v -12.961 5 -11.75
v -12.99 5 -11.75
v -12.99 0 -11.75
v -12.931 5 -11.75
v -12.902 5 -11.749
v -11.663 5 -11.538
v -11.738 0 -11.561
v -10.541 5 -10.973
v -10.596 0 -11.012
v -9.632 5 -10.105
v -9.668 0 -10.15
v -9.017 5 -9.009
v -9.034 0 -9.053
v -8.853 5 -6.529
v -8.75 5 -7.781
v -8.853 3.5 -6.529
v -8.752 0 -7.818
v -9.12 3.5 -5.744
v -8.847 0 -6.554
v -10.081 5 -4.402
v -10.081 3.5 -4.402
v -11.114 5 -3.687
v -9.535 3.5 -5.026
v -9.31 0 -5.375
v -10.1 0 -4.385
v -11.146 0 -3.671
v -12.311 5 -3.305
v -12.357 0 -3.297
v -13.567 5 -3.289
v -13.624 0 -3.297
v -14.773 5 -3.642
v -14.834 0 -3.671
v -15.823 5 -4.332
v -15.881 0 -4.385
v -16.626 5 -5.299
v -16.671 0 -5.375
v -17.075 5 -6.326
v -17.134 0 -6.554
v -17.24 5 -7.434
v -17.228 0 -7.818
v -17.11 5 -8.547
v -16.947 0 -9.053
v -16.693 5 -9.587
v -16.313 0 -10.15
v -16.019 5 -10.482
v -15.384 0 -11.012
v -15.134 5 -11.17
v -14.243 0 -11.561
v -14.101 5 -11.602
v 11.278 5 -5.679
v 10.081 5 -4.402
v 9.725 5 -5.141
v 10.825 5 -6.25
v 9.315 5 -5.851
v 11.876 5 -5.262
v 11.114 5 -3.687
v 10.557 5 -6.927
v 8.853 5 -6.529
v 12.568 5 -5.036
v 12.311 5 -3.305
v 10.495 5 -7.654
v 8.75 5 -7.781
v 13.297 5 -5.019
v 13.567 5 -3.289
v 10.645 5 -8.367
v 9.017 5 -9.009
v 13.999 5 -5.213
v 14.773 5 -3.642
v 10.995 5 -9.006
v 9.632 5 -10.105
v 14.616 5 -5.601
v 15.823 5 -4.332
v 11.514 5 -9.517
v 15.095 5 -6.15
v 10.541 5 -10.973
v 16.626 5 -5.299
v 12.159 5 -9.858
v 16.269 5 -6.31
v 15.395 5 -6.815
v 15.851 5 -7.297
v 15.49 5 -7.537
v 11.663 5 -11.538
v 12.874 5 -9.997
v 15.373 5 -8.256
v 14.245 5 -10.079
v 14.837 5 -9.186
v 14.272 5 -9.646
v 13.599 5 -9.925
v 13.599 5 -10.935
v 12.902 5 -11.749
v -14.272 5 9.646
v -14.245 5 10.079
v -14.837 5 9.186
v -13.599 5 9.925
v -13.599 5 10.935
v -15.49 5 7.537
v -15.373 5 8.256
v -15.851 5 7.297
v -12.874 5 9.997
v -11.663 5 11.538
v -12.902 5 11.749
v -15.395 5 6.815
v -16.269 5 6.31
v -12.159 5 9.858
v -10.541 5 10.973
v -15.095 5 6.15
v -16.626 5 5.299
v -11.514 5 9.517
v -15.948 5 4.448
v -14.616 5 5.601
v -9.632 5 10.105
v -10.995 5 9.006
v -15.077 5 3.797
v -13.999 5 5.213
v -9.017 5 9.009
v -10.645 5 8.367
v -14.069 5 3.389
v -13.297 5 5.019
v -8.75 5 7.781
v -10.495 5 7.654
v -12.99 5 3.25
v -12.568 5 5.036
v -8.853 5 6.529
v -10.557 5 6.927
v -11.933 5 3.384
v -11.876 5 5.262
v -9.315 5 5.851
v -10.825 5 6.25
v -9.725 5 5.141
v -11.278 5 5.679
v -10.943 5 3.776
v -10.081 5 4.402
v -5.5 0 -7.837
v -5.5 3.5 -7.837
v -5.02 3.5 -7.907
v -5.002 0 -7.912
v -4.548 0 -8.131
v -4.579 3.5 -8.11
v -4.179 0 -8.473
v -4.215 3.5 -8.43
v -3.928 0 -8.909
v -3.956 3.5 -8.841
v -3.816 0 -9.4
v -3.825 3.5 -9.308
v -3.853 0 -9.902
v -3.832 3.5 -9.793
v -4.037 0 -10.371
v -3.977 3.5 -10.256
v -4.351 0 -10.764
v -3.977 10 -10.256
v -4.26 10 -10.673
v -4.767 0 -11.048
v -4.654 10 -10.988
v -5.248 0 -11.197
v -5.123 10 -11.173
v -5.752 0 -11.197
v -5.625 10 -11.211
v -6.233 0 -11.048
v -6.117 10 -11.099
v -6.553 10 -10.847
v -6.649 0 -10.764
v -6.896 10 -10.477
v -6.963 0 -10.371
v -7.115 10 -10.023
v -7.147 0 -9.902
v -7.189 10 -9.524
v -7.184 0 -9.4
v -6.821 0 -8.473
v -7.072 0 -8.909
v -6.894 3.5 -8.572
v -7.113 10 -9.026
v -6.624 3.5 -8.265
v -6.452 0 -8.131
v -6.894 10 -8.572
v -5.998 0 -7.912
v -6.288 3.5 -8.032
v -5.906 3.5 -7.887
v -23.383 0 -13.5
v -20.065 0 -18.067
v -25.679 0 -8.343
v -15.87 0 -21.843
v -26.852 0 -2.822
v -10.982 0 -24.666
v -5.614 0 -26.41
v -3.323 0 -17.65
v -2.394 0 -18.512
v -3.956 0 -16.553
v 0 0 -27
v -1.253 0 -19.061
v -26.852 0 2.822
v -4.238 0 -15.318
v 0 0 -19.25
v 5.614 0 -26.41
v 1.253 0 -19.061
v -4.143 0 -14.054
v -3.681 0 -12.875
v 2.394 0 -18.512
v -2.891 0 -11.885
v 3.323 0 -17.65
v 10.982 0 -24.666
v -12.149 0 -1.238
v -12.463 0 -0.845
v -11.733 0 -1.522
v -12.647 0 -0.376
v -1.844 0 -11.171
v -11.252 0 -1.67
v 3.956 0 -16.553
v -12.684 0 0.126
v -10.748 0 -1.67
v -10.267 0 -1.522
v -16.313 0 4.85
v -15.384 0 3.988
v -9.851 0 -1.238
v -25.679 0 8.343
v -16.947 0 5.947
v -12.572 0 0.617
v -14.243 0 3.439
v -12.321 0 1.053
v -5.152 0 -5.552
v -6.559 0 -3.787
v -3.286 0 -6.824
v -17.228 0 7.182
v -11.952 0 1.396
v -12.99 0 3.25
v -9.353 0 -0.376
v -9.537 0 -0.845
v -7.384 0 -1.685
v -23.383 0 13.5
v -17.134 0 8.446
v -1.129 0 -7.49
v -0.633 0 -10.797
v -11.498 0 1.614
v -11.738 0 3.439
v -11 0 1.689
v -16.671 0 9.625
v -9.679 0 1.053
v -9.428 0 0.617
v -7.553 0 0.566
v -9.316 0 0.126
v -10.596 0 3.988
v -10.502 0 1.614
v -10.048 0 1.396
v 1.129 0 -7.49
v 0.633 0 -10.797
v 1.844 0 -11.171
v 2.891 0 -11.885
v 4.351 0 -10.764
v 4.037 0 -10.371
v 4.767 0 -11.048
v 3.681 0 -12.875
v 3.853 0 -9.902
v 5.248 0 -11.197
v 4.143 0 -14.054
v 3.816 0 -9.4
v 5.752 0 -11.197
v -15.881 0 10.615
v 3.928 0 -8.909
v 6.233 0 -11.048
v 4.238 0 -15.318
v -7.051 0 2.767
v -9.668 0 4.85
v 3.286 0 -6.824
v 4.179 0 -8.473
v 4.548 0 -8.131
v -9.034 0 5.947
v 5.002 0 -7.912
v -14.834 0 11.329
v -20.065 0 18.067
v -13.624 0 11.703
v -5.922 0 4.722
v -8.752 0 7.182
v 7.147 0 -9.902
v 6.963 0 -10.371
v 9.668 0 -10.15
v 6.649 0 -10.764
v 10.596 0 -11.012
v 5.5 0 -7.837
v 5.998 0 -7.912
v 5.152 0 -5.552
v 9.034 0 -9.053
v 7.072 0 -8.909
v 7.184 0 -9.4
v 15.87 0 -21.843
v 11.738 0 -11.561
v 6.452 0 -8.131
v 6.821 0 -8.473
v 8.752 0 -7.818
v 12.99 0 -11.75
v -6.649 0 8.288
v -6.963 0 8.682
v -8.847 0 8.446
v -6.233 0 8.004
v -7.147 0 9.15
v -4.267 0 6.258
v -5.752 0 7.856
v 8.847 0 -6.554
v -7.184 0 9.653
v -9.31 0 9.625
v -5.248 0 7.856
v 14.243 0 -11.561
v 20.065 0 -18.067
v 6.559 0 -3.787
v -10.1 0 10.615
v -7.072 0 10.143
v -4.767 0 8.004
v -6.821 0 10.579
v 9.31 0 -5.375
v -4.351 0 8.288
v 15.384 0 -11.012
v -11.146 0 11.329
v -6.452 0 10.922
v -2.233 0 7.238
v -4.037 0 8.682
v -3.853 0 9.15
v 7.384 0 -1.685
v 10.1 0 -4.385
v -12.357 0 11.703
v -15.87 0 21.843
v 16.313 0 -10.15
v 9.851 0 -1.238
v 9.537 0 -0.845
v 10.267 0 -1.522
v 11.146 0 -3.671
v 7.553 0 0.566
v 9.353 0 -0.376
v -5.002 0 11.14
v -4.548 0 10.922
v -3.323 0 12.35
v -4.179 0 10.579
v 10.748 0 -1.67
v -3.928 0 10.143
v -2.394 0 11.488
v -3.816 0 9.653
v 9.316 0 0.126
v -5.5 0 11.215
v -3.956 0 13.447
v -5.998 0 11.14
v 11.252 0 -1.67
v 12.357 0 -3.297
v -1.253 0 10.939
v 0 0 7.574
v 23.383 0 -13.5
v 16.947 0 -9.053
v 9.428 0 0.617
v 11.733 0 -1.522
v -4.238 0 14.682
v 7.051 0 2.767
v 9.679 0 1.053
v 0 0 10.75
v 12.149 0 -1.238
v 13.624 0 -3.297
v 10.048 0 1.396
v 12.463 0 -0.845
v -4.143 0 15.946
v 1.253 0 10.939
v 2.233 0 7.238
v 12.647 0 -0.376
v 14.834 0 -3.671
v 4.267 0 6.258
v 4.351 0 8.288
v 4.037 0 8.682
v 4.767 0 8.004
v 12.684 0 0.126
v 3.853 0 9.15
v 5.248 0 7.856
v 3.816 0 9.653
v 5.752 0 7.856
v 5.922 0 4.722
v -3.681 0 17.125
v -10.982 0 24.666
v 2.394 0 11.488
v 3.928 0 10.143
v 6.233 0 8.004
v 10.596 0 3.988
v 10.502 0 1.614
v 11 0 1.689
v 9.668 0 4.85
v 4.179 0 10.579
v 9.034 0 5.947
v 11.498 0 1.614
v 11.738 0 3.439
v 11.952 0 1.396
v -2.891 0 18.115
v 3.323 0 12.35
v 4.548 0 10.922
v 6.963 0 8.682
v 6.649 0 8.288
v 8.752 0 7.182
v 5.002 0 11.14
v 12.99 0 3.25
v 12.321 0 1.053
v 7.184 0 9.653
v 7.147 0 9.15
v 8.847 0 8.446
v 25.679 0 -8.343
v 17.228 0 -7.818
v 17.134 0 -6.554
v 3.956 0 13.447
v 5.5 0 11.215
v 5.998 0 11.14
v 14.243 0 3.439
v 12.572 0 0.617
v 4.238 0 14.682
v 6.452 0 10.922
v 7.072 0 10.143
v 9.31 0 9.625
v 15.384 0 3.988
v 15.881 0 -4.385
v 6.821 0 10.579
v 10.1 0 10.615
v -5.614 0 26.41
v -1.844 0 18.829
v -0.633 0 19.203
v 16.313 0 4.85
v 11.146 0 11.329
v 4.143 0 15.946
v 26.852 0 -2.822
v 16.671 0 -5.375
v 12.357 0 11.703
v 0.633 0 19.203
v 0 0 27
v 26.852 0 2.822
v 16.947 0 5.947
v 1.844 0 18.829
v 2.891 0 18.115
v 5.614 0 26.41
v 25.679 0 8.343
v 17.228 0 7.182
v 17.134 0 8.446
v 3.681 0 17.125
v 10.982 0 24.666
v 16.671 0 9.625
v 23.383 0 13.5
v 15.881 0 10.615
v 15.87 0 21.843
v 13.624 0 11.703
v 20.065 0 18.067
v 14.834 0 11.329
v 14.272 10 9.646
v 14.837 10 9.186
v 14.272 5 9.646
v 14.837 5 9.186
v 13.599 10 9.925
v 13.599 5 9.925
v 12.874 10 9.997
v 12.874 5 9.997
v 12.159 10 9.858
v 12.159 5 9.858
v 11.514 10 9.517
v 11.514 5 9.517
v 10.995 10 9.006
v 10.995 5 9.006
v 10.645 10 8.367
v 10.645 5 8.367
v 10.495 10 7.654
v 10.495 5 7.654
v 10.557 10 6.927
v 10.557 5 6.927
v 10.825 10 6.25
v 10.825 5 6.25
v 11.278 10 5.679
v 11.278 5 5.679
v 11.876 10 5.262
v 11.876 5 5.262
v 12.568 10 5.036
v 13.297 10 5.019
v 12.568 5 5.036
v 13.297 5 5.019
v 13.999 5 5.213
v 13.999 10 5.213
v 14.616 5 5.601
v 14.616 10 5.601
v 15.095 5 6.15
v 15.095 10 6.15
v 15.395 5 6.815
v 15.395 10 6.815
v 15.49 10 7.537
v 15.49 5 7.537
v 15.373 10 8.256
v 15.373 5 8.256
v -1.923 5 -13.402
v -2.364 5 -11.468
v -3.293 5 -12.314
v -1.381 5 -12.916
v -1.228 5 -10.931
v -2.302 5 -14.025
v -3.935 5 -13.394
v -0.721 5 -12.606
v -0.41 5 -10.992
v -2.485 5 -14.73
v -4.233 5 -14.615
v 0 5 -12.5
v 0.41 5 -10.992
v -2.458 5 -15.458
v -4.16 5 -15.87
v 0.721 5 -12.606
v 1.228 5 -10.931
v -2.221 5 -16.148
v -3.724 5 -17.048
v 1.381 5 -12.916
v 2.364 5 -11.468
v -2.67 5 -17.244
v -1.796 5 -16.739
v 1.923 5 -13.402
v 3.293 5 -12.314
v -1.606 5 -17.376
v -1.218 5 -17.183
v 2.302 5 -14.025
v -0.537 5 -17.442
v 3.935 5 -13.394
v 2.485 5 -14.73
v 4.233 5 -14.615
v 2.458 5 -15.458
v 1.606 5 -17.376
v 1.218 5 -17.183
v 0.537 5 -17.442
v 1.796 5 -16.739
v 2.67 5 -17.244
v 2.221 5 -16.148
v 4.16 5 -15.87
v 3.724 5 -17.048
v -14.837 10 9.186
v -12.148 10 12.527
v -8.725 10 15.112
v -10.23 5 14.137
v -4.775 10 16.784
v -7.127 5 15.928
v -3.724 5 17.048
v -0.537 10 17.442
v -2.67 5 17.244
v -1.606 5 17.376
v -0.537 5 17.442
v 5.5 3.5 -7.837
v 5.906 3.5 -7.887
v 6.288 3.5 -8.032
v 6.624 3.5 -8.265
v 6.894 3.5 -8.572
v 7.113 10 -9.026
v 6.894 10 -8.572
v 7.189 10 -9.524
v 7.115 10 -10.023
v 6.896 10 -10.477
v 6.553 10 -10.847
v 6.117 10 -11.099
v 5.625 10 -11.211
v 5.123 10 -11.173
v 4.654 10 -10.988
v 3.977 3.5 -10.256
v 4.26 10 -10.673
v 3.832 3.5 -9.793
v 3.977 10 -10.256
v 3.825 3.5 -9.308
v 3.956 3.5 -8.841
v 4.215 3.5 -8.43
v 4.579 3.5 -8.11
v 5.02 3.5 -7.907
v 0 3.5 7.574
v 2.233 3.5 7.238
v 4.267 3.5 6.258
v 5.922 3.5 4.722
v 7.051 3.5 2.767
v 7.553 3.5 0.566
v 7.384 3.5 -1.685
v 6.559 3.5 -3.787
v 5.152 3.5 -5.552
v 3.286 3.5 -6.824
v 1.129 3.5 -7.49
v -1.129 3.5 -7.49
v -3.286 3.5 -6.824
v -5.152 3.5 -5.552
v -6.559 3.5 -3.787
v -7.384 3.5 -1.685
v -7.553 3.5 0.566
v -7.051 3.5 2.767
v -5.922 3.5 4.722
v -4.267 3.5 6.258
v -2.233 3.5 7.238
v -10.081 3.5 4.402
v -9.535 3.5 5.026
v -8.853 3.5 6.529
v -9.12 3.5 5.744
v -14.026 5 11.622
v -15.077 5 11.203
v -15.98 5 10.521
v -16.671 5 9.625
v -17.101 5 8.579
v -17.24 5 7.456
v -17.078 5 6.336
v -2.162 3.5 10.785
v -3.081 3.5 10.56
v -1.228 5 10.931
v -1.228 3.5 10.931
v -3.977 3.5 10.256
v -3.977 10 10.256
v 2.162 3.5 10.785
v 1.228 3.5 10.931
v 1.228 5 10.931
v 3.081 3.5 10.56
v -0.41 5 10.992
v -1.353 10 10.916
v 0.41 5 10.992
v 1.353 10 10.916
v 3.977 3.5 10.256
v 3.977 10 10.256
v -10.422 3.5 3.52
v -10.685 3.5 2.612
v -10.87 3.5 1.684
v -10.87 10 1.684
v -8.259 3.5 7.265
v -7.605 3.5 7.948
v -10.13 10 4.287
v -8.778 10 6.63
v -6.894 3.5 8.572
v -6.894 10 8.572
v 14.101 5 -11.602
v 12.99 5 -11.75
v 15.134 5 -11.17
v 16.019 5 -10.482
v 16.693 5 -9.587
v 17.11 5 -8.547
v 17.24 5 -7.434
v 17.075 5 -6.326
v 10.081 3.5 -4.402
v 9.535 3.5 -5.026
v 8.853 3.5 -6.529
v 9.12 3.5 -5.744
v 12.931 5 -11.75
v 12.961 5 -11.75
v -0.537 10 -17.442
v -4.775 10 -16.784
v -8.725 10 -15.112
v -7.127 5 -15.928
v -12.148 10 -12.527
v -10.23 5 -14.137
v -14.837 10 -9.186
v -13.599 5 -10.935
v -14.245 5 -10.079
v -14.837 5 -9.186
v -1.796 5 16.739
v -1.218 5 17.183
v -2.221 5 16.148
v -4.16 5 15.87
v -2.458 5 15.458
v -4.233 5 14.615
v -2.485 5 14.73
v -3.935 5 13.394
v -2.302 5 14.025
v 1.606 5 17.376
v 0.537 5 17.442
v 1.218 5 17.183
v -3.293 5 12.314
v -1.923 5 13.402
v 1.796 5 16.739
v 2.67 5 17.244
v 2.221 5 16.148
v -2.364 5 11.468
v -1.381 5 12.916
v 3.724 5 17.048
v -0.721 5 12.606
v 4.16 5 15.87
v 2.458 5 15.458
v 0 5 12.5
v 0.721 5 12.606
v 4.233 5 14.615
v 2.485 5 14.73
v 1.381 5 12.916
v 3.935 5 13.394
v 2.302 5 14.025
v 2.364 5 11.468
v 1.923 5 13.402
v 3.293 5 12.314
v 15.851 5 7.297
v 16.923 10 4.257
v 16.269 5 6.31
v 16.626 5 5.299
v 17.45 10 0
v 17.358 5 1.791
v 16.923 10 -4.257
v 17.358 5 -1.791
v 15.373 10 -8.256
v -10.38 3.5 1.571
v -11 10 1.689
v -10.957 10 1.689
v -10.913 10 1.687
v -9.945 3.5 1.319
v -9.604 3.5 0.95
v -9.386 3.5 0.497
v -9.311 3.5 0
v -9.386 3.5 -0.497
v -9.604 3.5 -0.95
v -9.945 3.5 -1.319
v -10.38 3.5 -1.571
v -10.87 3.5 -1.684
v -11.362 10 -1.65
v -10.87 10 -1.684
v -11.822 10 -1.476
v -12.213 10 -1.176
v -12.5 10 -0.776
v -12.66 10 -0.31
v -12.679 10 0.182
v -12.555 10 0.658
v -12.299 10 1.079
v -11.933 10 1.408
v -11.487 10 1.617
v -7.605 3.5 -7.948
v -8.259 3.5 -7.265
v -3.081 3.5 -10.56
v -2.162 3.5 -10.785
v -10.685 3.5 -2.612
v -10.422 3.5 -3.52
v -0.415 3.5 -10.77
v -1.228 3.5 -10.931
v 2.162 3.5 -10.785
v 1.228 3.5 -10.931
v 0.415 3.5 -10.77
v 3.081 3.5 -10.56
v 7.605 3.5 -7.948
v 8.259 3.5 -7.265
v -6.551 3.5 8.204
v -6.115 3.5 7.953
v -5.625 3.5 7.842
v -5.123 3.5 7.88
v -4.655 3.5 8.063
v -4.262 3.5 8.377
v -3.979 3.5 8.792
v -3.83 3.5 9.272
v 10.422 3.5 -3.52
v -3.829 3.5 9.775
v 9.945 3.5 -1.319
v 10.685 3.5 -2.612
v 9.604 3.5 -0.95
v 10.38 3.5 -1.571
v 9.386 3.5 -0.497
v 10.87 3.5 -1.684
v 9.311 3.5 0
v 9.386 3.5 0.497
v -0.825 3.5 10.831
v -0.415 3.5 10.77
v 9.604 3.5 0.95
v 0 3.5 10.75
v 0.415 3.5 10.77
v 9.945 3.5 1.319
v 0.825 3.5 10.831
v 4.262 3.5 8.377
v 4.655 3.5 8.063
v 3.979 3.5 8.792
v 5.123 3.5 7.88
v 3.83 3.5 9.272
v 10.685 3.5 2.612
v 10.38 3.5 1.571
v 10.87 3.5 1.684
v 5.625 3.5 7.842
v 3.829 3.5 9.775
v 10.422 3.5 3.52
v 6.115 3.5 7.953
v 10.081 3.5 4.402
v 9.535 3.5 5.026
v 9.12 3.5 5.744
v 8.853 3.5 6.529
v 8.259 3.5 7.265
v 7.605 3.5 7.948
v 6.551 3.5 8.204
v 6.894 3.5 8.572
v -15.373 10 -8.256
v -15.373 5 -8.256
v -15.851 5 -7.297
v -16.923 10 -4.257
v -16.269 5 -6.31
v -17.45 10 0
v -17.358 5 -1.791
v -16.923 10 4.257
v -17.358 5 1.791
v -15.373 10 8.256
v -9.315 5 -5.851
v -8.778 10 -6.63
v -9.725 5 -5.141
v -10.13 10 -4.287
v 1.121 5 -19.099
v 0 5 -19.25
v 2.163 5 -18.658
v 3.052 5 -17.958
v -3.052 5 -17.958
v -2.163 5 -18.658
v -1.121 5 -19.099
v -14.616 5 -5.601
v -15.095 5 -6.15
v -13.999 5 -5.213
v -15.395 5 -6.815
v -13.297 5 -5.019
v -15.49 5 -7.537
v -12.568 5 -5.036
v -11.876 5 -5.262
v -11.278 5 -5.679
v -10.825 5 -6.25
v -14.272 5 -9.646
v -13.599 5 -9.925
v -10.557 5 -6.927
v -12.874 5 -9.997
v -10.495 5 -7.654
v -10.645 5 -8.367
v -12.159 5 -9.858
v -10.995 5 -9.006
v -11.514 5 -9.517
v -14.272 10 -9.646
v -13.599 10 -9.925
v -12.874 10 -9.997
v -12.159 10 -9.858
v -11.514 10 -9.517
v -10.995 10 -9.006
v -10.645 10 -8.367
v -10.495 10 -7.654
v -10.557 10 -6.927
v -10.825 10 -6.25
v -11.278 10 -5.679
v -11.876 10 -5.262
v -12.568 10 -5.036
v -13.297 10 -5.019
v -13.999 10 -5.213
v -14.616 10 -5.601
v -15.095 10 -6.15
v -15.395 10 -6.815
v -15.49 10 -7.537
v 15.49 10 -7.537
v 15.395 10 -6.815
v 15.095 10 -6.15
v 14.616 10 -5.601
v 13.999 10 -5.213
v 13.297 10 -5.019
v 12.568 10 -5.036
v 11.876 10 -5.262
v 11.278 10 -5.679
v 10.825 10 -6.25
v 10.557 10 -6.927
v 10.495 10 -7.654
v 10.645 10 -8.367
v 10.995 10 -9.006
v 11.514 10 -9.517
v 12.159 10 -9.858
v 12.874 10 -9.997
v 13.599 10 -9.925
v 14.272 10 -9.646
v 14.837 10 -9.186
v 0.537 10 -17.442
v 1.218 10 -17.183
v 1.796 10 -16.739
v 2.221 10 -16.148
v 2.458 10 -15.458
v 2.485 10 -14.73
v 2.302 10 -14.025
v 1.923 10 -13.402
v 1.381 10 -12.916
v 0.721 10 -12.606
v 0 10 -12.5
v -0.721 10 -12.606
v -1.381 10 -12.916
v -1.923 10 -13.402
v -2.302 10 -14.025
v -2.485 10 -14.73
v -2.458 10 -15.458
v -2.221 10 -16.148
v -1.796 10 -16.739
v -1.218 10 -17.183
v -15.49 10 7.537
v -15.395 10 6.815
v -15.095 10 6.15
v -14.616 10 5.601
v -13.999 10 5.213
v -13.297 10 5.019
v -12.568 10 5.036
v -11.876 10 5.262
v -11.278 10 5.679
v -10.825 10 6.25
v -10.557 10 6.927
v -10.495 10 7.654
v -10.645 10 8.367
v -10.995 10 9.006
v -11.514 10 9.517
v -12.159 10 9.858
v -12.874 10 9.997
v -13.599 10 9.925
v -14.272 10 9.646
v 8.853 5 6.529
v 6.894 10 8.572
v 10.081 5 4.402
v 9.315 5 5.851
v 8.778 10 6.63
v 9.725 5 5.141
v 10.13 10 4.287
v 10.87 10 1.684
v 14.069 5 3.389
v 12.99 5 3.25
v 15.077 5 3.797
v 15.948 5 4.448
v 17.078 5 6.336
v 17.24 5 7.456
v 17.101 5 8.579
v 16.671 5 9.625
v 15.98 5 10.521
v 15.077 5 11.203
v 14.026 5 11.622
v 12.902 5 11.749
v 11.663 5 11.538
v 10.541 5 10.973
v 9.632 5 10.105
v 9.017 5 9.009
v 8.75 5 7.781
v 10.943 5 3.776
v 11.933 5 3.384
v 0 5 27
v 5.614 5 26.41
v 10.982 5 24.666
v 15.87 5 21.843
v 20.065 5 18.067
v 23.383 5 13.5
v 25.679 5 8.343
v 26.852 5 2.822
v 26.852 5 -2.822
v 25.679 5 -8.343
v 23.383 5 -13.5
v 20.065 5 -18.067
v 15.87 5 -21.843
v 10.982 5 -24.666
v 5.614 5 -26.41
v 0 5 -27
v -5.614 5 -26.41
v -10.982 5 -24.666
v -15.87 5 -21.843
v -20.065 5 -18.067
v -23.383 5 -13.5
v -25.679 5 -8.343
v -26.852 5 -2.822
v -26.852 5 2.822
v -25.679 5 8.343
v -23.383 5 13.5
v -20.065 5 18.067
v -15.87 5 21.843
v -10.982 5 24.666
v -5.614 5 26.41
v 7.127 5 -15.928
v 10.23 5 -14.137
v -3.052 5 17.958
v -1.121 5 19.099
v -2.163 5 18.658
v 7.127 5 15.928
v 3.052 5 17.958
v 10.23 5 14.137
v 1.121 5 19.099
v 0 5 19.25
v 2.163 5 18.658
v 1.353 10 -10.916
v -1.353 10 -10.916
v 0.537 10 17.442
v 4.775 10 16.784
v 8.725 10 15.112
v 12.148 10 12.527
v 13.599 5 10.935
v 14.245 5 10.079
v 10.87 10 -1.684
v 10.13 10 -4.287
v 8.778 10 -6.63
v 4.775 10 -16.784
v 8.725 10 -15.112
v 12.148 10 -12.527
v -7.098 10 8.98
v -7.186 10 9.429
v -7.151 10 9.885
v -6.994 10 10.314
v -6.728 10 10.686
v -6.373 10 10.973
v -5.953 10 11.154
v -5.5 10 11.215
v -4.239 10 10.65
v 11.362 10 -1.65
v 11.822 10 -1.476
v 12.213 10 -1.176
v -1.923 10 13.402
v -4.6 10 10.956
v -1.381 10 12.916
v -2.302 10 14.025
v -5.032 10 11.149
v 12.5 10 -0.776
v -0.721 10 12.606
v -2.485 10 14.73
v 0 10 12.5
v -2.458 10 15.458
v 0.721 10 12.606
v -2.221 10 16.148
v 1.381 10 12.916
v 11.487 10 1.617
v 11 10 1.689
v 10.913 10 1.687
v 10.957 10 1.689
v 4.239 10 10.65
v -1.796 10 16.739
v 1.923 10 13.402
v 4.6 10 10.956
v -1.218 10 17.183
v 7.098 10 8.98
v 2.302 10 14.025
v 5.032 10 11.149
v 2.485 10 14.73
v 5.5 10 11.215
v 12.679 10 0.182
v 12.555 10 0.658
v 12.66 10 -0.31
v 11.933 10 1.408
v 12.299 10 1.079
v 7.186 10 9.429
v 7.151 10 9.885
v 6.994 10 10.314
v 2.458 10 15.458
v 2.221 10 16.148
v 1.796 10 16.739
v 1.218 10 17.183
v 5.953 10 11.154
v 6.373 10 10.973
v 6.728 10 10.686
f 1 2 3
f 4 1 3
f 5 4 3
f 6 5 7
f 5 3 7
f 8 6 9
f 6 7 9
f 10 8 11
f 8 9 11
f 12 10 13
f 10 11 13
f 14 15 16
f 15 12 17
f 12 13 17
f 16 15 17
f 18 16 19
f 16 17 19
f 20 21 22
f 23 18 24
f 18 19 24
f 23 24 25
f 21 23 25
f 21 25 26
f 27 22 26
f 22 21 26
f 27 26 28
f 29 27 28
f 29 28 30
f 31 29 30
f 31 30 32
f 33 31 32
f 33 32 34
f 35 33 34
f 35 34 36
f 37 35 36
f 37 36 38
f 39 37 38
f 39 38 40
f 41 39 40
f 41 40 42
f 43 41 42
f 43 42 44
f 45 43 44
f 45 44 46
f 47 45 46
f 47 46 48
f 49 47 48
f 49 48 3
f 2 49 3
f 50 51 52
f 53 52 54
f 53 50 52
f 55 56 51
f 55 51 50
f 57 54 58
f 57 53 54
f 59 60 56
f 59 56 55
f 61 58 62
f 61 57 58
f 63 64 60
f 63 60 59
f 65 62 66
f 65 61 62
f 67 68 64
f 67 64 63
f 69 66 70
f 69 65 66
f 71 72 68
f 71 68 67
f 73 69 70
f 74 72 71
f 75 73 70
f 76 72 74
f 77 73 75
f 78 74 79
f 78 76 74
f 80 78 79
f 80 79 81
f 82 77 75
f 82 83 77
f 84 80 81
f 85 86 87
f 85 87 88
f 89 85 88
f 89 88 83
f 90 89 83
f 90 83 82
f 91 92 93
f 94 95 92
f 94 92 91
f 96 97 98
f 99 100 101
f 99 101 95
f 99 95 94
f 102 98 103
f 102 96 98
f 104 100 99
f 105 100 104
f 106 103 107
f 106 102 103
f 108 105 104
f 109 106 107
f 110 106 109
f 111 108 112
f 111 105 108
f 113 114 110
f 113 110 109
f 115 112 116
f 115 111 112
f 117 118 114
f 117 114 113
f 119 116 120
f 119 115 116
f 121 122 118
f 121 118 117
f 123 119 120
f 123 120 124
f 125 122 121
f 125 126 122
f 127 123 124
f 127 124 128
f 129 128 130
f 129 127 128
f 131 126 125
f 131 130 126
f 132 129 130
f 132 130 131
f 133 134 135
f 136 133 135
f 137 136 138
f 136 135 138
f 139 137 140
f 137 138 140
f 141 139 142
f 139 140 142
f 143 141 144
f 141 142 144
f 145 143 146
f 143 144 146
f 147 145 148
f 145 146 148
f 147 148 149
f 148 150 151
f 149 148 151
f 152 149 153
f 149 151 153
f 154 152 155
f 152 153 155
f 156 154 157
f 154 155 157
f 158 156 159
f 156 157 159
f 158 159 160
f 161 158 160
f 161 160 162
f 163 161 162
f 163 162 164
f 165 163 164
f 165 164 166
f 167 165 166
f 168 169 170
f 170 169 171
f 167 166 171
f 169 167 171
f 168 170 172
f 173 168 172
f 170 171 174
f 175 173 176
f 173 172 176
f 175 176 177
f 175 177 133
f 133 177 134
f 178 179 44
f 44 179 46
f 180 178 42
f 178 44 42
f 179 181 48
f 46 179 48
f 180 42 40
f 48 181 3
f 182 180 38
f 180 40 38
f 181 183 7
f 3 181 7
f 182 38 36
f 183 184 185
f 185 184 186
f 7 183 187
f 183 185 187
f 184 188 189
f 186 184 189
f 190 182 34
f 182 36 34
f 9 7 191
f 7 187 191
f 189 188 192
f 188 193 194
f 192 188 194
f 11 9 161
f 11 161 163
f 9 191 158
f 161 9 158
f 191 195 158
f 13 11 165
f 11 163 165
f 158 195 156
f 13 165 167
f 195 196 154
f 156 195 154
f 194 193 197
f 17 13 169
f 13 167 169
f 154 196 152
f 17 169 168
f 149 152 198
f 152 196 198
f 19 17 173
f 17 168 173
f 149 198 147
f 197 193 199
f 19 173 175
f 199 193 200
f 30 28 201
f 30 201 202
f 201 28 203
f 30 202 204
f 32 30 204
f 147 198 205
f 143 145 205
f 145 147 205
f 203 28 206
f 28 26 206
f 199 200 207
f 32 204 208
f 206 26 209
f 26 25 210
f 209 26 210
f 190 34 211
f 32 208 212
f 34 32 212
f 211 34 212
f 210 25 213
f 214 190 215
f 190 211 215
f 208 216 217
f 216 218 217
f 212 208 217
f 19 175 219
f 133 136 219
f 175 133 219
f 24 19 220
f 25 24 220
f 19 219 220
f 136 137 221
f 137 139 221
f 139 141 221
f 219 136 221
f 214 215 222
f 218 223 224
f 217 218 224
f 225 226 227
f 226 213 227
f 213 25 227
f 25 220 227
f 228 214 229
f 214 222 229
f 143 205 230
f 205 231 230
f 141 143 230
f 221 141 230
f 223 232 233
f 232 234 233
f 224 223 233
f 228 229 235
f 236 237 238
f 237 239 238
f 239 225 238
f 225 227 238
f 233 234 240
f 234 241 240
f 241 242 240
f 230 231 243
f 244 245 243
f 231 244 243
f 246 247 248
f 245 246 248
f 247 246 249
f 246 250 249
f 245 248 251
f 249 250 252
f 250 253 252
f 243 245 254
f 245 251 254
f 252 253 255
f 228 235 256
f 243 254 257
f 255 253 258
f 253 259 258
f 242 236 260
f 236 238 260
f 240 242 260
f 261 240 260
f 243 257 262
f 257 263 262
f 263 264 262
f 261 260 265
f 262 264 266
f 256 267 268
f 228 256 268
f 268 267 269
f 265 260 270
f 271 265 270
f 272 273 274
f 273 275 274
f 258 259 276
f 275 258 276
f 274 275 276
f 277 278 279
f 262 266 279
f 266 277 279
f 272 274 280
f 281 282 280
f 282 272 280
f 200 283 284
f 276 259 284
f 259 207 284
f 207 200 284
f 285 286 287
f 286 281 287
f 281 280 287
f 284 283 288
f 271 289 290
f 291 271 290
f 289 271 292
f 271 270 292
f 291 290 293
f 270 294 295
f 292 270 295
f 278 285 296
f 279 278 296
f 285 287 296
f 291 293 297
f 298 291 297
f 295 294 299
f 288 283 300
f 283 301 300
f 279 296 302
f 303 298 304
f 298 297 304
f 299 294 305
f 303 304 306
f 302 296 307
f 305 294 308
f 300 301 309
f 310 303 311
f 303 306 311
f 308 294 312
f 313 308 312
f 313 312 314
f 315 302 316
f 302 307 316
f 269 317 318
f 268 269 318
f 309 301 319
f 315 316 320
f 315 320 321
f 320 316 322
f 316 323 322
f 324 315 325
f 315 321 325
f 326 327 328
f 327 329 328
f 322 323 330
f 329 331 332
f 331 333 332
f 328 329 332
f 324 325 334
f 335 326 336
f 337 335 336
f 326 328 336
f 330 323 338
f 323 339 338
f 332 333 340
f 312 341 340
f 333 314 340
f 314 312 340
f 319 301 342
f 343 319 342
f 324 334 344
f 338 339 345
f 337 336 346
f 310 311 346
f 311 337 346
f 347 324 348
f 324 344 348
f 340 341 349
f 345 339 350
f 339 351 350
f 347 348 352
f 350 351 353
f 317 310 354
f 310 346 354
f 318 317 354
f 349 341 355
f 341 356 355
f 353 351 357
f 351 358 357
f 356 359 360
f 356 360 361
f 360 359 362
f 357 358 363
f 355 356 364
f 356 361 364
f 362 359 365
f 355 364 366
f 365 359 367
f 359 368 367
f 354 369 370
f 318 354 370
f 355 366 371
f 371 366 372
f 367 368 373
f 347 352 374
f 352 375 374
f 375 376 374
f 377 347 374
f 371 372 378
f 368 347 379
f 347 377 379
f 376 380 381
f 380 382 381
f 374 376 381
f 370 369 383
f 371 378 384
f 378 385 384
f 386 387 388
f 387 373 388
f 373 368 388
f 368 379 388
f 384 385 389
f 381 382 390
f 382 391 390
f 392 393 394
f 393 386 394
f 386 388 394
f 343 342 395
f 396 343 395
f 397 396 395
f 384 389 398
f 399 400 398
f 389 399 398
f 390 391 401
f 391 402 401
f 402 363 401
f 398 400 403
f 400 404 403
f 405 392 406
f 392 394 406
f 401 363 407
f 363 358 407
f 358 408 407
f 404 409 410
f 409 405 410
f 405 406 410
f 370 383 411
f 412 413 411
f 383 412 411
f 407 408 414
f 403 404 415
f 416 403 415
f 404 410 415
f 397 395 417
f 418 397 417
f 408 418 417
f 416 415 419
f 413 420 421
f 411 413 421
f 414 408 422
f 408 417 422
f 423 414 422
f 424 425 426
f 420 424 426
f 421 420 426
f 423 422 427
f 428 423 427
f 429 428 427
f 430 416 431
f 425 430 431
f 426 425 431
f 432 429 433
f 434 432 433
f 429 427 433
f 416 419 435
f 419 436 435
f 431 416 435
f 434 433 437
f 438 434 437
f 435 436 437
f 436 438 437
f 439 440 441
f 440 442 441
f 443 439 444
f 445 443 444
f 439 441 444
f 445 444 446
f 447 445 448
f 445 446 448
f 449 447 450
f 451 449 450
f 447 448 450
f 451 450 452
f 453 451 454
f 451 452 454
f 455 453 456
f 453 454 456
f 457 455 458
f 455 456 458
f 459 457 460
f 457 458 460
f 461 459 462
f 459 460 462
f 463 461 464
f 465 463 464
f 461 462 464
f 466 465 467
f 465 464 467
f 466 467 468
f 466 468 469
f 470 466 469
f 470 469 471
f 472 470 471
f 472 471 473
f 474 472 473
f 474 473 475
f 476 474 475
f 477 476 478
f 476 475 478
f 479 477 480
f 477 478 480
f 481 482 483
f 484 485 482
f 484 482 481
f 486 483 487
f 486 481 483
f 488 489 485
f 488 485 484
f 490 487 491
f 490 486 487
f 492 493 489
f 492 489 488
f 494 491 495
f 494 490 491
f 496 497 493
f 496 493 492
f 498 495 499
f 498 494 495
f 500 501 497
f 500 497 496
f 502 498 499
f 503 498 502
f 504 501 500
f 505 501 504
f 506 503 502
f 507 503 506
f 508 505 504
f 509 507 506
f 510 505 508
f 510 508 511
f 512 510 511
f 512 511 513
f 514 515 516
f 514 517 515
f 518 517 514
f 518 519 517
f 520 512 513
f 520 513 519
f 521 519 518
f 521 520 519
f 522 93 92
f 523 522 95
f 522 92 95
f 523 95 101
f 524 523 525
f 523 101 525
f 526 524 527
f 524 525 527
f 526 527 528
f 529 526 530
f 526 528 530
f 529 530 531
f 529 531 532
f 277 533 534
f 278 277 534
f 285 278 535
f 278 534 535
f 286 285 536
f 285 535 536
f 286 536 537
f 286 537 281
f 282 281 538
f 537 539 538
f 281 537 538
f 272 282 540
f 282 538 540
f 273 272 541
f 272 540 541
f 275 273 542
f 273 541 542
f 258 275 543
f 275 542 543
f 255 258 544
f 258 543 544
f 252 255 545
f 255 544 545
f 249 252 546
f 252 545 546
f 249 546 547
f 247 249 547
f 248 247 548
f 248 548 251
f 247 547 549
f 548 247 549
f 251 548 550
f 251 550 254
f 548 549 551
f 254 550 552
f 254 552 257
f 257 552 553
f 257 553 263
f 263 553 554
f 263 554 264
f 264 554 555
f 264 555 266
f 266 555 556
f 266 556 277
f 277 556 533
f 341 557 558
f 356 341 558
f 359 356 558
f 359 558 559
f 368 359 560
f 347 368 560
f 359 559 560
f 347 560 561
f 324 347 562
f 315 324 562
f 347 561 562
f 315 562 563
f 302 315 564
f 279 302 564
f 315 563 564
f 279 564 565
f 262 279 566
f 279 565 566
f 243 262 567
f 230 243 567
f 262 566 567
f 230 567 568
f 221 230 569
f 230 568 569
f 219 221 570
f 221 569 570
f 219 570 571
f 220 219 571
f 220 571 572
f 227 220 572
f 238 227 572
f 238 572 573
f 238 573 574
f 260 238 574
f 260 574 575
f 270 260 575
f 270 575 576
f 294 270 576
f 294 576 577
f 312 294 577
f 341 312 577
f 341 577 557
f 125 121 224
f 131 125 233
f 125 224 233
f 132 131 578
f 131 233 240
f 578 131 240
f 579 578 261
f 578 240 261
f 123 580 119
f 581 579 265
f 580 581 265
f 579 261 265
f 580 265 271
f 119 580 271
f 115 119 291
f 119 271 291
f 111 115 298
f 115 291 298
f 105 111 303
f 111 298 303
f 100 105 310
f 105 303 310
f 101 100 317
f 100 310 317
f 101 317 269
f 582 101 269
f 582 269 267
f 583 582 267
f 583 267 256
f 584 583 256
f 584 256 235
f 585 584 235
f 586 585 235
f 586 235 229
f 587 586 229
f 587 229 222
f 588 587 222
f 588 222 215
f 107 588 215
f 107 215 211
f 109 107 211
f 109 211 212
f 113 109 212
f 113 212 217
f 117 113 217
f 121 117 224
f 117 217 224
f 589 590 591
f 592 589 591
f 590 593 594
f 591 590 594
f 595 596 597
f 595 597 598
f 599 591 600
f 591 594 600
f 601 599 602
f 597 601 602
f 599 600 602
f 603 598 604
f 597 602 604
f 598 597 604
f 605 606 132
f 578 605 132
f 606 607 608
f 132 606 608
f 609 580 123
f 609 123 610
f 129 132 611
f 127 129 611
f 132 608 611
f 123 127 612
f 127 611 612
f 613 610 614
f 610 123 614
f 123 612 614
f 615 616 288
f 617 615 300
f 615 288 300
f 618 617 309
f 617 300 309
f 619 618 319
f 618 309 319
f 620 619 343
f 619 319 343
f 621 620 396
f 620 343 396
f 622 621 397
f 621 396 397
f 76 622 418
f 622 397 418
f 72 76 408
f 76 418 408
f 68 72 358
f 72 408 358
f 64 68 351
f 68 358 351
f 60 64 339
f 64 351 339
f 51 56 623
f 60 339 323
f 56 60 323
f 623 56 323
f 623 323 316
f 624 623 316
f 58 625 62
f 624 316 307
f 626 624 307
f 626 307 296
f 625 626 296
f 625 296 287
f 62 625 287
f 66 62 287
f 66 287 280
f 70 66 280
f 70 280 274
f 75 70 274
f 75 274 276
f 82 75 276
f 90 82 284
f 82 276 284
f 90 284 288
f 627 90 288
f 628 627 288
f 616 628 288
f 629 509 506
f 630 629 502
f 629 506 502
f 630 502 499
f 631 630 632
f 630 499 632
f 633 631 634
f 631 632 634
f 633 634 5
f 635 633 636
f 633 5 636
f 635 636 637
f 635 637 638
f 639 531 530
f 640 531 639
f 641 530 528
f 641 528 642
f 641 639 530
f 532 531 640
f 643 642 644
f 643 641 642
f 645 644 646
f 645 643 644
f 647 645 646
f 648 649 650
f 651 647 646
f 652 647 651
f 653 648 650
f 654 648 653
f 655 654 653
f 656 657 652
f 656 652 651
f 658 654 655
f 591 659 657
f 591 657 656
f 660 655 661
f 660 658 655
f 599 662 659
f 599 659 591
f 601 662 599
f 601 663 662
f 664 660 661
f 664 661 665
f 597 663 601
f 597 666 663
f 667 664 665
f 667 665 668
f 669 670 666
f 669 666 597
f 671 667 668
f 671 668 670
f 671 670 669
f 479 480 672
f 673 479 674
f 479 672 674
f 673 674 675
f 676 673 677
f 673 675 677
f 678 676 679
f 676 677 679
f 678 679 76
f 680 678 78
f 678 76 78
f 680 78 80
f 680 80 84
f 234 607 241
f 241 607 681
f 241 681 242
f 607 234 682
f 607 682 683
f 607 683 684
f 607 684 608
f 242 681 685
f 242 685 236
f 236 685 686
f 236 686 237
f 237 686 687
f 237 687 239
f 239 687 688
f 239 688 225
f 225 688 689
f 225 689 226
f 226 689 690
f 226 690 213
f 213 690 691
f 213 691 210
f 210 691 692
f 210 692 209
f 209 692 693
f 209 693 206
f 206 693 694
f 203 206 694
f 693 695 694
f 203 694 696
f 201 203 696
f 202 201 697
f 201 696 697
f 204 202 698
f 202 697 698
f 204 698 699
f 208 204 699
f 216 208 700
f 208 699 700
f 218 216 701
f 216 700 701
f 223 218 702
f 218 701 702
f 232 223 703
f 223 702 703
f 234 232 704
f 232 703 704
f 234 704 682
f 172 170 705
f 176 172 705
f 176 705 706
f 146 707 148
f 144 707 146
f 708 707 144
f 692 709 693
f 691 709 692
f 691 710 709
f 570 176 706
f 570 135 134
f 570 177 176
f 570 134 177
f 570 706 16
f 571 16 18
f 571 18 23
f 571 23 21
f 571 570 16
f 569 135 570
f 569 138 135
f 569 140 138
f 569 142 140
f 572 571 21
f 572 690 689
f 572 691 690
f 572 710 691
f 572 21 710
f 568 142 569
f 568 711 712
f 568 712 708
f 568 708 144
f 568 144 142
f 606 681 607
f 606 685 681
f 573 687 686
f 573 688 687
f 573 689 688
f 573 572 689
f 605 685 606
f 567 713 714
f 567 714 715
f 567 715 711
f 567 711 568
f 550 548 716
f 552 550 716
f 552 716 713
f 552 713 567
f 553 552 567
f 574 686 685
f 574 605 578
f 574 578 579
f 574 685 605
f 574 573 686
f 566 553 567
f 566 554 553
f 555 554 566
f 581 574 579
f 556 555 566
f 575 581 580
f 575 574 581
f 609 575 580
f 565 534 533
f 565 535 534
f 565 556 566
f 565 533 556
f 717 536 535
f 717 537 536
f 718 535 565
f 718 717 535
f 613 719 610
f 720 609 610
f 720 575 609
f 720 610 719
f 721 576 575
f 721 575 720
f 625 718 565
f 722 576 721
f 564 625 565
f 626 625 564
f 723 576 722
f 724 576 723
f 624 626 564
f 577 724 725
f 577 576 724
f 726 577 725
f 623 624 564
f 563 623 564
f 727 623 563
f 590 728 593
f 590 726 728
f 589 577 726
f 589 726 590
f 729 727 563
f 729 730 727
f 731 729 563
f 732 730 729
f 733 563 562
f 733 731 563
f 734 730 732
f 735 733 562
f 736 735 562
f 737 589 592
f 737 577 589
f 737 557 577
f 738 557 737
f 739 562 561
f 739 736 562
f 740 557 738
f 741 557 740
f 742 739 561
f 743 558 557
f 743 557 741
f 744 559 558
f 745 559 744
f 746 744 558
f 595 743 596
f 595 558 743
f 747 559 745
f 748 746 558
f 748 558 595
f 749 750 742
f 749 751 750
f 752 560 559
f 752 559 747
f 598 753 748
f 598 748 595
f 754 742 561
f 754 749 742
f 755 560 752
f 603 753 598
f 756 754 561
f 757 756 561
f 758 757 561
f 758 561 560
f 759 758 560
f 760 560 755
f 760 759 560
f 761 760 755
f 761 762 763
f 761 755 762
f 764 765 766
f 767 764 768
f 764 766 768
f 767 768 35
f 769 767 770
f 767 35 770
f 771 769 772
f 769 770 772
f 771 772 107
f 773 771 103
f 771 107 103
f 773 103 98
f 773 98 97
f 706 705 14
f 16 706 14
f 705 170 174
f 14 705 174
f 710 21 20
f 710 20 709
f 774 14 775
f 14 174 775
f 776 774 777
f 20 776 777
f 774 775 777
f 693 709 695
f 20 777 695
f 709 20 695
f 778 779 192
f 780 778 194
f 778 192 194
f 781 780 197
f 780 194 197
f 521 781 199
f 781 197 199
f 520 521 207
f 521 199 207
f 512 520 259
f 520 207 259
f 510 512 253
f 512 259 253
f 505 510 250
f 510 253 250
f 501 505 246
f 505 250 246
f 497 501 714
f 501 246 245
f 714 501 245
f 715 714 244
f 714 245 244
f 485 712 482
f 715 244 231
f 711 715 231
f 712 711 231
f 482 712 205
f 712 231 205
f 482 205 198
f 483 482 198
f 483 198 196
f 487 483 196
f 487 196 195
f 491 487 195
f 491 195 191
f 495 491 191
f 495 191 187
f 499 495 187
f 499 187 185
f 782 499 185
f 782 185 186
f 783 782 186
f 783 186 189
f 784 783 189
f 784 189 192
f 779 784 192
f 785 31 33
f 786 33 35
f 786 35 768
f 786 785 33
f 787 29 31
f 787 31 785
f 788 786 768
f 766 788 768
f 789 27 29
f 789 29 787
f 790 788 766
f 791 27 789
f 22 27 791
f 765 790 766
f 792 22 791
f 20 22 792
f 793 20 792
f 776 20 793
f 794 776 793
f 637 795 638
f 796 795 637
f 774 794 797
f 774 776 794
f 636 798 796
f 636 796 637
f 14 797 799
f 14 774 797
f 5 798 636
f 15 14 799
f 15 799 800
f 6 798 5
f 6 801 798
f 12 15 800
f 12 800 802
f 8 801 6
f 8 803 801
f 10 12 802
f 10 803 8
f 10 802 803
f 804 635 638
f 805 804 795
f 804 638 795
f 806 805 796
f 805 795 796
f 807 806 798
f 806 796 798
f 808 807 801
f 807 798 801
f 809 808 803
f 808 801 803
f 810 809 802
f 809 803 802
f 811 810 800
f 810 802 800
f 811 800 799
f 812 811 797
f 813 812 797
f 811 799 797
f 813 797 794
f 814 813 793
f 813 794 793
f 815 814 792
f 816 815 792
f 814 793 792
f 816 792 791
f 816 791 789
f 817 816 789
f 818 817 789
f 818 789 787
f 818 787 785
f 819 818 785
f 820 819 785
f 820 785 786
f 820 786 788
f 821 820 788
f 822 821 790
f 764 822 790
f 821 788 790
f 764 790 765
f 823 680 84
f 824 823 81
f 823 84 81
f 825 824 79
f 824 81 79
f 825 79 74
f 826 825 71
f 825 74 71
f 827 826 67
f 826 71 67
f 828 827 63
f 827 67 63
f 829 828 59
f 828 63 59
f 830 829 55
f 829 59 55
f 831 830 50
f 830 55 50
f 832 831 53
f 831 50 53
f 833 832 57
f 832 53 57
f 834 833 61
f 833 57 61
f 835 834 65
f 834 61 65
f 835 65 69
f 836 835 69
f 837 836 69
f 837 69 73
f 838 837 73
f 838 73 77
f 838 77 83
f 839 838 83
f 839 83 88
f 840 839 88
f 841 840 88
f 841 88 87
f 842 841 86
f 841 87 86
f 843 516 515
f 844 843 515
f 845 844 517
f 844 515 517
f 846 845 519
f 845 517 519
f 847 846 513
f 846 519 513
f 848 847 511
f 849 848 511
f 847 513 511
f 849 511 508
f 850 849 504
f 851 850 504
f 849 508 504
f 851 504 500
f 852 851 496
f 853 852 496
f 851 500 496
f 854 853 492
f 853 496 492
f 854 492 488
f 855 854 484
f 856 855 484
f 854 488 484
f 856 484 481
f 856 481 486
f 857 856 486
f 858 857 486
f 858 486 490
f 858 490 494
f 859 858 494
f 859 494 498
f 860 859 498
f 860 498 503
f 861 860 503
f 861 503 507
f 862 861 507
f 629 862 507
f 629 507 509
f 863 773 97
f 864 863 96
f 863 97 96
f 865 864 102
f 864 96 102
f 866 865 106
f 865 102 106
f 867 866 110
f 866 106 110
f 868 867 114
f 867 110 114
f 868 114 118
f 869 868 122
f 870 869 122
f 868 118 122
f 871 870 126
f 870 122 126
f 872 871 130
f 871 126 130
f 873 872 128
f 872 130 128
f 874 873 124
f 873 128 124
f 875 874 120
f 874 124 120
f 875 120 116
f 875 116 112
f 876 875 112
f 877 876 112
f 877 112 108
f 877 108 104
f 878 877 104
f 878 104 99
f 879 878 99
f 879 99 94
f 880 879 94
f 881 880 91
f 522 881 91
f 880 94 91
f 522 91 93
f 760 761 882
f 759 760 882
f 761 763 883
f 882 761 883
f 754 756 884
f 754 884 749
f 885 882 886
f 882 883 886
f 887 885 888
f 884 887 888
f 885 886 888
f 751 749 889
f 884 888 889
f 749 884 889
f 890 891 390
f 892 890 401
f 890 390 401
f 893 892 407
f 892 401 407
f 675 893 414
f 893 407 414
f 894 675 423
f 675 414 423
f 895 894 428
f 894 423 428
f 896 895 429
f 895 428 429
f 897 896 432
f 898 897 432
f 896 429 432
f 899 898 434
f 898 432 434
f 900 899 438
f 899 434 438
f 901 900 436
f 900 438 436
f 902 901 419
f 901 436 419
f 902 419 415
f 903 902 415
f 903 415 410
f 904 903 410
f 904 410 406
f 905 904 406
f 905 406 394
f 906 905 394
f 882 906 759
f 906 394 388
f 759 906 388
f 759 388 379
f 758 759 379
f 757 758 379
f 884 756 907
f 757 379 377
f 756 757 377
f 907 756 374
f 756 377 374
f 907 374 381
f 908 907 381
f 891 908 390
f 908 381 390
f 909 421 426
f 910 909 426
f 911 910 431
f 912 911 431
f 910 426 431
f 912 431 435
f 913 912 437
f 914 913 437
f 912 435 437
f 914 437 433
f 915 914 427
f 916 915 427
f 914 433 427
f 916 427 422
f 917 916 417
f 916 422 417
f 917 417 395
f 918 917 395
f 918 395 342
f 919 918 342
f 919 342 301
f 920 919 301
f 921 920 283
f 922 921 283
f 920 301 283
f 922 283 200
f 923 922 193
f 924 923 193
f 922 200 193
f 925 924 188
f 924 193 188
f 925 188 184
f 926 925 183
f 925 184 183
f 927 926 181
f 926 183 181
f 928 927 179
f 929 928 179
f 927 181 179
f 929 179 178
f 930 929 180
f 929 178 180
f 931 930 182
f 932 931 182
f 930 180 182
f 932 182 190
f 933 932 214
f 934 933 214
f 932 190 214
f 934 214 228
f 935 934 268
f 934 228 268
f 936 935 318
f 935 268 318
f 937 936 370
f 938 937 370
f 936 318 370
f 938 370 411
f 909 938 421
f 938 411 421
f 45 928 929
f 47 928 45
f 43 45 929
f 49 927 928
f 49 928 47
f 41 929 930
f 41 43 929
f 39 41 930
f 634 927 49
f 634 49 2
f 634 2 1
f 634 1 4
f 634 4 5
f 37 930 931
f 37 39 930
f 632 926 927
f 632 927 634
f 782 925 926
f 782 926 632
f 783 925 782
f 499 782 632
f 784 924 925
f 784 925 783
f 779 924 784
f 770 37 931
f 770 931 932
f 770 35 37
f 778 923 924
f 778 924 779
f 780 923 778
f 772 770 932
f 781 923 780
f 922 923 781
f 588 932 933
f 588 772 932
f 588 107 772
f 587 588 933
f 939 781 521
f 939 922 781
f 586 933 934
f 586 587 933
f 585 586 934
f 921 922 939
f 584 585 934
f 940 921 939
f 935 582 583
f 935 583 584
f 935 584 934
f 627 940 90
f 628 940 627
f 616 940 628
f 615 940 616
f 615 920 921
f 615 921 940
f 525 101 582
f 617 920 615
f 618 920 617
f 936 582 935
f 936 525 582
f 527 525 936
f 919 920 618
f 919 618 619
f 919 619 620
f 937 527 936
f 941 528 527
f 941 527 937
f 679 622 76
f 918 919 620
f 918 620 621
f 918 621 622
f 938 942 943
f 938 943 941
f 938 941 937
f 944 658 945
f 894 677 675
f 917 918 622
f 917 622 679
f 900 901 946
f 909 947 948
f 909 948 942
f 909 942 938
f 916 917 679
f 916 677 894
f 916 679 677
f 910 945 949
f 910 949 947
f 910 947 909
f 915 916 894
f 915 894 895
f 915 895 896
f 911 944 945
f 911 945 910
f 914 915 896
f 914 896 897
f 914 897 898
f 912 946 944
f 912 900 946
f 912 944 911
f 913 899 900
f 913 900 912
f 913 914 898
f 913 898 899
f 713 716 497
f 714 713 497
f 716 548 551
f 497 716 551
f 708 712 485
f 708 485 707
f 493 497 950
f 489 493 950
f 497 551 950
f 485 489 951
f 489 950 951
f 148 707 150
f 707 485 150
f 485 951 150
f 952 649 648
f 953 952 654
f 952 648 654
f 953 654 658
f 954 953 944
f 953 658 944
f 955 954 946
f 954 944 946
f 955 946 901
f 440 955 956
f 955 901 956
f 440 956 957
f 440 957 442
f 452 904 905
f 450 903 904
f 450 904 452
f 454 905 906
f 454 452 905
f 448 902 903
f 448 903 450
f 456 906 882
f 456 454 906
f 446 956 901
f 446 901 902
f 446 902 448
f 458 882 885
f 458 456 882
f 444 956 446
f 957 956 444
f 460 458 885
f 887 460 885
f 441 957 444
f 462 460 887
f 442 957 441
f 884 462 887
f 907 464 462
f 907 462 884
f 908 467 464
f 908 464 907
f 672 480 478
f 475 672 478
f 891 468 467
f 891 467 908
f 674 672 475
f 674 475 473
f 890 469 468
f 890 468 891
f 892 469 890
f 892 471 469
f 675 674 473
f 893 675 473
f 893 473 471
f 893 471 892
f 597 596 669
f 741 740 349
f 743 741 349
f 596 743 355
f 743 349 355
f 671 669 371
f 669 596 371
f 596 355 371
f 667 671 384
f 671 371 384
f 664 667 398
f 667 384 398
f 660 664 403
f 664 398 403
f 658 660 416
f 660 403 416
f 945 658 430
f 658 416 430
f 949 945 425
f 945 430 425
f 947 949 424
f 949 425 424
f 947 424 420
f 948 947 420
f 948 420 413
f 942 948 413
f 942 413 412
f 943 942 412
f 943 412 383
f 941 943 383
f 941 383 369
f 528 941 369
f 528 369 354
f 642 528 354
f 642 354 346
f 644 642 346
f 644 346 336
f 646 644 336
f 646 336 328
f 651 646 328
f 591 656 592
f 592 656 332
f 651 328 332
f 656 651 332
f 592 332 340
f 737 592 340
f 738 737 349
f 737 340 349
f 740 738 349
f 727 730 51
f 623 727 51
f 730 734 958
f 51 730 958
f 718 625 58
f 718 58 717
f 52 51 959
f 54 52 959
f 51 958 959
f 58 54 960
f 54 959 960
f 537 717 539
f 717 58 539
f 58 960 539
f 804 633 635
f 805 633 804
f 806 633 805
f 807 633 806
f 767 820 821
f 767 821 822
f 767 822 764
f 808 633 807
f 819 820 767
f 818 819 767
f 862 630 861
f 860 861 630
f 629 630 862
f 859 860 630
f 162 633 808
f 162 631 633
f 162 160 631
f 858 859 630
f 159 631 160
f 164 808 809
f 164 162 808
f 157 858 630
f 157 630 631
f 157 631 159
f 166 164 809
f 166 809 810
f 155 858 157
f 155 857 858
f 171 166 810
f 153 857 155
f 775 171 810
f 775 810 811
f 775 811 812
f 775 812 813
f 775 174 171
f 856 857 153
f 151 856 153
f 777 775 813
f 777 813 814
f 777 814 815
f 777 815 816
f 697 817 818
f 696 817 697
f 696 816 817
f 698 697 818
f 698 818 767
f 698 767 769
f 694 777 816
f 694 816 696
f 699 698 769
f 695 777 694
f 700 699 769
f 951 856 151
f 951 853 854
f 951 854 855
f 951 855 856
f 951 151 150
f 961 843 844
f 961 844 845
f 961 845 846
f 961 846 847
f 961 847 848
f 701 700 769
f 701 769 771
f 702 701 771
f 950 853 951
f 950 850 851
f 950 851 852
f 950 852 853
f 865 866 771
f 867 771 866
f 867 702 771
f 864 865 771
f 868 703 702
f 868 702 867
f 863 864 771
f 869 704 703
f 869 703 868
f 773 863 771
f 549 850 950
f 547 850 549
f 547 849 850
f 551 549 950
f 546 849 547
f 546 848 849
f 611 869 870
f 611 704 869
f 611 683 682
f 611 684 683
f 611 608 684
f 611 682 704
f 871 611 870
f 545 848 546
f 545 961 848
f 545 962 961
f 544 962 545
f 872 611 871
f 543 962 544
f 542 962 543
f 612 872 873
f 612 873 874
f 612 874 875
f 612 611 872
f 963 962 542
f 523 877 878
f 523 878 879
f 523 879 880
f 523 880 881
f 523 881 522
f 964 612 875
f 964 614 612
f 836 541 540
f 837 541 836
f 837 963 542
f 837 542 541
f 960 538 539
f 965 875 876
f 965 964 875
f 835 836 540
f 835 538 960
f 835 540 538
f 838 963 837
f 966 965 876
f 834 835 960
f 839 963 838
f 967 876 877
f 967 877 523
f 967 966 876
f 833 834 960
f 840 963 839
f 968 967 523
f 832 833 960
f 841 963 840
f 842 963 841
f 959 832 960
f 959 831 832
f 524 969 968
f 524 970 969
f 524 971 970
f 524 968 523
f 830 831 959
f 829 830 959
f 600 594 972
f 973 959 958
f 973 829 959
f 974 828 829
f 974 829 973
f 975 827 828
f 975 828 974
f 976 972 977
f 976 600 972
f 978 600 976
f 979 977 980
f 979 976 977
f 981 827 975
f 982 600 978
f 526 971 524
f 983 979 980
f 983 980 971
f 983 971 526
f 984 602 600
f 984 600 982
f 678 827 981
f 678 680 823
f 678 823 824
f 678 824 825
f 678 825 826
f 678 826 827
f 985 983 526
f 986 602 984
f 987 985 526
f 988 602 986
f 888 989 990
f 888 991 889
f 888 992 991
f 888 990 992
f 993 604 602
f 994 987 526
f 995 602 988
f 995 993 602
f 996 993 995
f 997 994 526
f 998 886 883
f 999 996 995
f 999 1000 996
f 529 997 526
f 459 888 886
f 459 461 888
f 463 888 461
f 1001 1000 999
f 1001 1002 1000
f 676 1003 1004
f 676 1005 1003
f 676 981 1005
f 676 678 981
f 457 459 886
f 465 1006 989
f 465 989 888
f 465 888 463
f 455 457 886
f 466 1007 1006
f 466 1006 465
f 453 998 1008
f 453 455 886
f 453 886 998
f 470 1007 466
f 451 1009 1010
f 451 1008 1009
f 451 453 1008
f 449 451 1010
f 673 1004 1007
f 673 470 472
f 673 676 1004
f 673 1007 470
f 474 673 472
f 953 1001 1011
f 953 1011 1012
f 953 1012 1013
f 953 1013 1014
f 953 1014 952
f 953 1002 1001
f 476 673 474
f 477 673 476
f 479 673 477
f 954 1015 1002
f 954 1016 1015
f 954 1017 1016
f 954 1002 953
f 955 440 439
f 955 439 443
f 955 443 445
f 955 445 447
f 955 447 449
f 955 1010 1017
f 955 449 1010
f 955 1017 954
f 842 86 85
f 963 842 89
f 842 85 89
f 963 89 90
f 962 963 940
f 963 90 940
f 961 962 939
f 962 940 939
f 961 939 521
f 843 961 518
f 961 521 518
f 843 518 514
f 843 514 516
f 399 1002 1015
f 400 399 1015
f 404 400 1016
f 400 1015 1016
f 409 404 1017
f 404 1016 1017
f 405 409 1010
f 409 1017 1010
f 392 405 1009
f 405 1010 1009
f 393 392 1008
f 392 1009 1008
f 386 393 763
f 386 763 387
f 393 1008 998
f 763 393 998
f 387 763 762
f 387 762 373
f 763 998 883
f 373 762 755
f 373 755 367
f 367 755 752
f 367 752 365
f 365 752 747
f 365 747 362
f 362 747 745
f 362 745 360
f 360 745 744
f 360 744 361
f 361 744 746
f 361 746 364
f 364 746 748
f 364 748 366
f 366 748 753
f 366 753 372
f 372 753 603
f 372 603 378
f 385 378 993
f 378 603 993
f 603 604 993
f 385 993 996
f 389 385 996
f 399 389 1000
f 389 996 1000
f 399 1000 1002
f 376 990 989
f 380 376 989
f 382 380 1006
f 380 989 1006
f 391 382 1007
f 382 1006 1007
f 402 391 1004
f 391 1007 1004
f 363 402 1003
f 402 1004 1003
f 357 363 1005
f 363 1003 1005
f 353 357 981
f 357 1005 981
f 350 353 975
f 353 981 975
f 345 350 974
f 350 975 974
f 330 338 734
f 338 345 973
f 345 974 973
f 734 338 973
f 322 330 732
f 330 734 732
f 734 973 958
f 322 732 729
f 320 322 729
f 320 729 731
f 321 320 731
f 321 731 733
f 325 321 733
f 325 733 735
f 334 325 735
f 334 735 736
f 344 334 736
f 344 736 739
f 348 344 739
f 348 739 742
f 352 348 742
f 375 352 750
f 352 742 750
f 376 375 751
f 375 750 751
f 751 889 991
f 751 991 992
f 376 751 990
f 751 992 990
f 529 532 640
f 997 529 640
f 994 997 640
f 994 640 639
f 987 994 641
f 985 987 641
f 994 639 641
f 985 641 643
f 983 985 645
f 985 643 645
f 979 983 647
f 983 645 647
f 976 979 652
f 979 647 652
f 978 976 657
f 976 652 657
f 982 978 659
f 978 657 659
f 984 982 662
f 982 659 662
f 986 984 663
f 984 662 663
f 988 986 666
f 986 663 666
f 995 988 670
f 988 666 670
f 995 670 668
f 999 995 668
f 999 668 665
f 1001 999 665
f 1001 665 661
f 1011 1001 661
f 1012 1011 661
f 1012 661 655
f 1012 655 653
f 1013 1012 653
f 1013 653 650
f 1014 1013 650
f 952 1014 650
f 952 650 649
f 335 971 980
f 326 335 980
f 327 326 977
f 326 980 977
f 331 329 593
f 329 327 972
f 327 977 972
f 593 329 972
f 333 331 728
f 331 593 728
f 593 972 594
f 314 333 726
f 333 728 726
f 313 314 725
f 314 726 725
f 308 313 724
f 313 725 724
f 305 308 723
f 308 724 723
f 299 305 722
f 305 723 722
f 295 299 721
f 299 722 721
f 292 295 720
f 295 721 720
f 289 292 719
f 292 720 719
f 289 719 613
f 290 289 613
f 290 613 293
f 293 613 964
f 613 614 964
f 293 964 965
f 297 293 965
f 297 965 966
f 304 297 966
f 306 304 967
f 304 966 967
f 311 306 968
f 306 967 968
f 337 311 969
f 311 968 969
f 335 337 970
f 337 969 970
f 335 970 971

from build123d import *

# Parameters (mm, degrees)
SKETCH1_R           = 27
BOSS_EXTRUDE1_DEPTH = 5
SKETCH2_R           = 17.45
BOSS_EXTRUDE2_DEPTH = 5
SKETCH3_R           = 2.5
CUT_EXTRUDE1_DEPTH  = 15
SKETCH5_R           = 11
CUT_EXTRUDE2_DEPTH  = 6.5
SKETCH6_R           = 1.689113582
CUT_EXTRUDE3_DEPTH  = 36.5
SKETCH7_R           = 5
CUT_EXTRUDE4_DEPTH  = 36.5
SKETCH8_R           = 4.25
CUT_EXTRUDE5_DEPTH  = 5
CUT_EXTRUDE6_REACH  = 40.733
SKETCH10_R          = 7.574183751


with BuildPart() as part:
    # Sketch1 → Boss-Extrude1 (new body)
    with BuildSketch(Plane(origin=(0, 0, 0), x_dir=(1, 0, 0), z_dir=(0, 1, 0))):
        with Locations(Location((0, 0, 0), (0, 0, 270))):
            Circle(SKETCH1_R)
    extrude(amount=BOSS_EXTRUDE1_DEPTH)

    # Sketch2 → Boss-Extrude2 (add)
    with BuildSketch(Plane(origin=(0, 5, 0), x_dir=(1, 0, 0), z_dir=(0, 1, 0))):
        with Locations(Location((0, 0, 0), (0, 0, 270))):
            Circle(SKETCH2_R)
    extrude(amount=BOSS_EXTRUDE2_DEPTH)

    # Sketch3 → Cut-Extrude1 (cut)
    with BuildSketch(Plane.XZ):
        with Locations(Location((0, 15, 0), (0, 0, 270))):
            Circle(SKETCH3_R)
        with Locations(Location((12.990381057, 7.5, 0), (0, 0, 270))):
            Circle(SKETCH3_R)
        with Locations(Location((12.990381057, -7.5, 0), (0, 0, 270))):
            Circle(SKETCH3_R)
        with Locations(Location((0, -15, 0), (0, 0, 270))):
            Circle(SKETCH3_R)
        with Locations(Location((-12.990381057, -7.5, 0), (0, 0, 270))):
            Circle(SKETCH3_R)
        with Locations(Location((-12.990381057, 7.5, 0), (0, 0, 270))):
            Circle(SKETCH3_R)
    extrude(amount=-CUT_EXTRUDE1_DEPTH, mode=Mode.SUBTRACT)

    # Sketch5 → Cut-Extrude2 (cut)
    with BuildSketch(Plane(origin=(0, 10, 0), x_dir=(1, 0, 0), z_dir=(0, 1, 0))):
        with Locations(Location((0, 0, 0), (0, 0, 270))):
            Circle(SKETCH5_R)
    extrude(amount=-CUT_EXTRUDE2_DEPTH, mode=Mode.SUBTRACT)

    # Sketch6 → Cut-Extrude3 (cut)
    with BuildSketch(Plane(origin=(0, 10, 0), x_dir=(1, 0, 0), z_dir=(0, 1, 0))):
        with Locations(Location((-11, 0, 0), (0, 0, 270))):
            Circle(SKETCH6_R)
        with Locations(Location((-5.5, 9.526279442, 0), (0, 0, 270))):
            Circle(SKETCH6_R)
        with Locations(Location((5.5, 9.526279442, 0), (0, 0, 270))):
            Circle(SKETCH6_R)
        with Locations(Location((11, 0, 0), (0, 0, 270))):
            Circle(SKETCH6_R)
        with Locations(Location((5.5, -9.526279442, 0), (0, 0, 270))):
            Circle(SKETCH6_R)
        with Locations(Location((-5.5, -9.526279442, 0), (0, 0, 270))):
            Circle(SKETCH6_R)
    extrude(amount=-CUT_EXTRUDE3_DEPTH, mode=Mode.SUBTRACT)

    # Sketch7 → Cut-Extrude4 (cut)
    with BuildSketch(Plane(origin=(0, 3.5, 0), x_dir=(1, 0, 0), z_dir=(0, 1, 0))):
        with Locations(Location((0, 0, 0), (0, 0, 270))):
            Circle(SKETCH7_R)
    extrude(amount=-CUT_EXTRUDE4_DEPTH, mode=Mode.SUBTRACT)

    # Sketch8 → Cut-Extrude5 (cut)
    with BuildSketch(Plane.XZ):
        with Locations(Location((0, 15, 0), (0, 0, 270))):
            Circle(SKETCH8_R)
        with Locations(Location((12.990381057, 7.5, 0), (0, 0, 270))):
            Circle(SKETCH8_R)
        with Locations(Location((12.990381057, -7.5, 0), (0, 0, 270))):
            Circle(SKETCH8_R)
        with Locations(Location((0, -15, 0), (0, 0, 270))):
            Circle(SKETCH8_R)
        with Locations(Location((-12.990381057, -7.5, 0), (0, 0, 270))):
            Circle(SKETCH8_R)
        with Locations(Location((-12.990381057, 7.5, 0), (0, 0, 270))):
            Circle(SKETCH8_R)
    extrude(amount=-CUT_EXTRUDE5_DEPTH, mode=Mode.SUBTRACT)

    # Sketch10 → Cut-Extrude6 (cut, up to next)
    with BuildSketch(Plane(origin=(0, 3.5, 0), x_dir=(1, 0, 0), z_dir=(0, 1, 0)), mode=Mode.PRIVATE) as cut_extrude6_sk1:
        with Locations(Location((0, 0, 0), (0, 0, 270))):
            Circle(SKETCH10_R)
    cut_extrude6_tool1 = extrude(cut_extrude6_sk1.sketch, amount=-CUT_EXTRUDE6_REACH, mode=Mode.PRIVATE) & part.part
    add(cut_extrude6_tool1.solids().sort_by_distance((0, 3.5, 0))[0], mode=Mode.SUBTRACT)


solid = part.part
